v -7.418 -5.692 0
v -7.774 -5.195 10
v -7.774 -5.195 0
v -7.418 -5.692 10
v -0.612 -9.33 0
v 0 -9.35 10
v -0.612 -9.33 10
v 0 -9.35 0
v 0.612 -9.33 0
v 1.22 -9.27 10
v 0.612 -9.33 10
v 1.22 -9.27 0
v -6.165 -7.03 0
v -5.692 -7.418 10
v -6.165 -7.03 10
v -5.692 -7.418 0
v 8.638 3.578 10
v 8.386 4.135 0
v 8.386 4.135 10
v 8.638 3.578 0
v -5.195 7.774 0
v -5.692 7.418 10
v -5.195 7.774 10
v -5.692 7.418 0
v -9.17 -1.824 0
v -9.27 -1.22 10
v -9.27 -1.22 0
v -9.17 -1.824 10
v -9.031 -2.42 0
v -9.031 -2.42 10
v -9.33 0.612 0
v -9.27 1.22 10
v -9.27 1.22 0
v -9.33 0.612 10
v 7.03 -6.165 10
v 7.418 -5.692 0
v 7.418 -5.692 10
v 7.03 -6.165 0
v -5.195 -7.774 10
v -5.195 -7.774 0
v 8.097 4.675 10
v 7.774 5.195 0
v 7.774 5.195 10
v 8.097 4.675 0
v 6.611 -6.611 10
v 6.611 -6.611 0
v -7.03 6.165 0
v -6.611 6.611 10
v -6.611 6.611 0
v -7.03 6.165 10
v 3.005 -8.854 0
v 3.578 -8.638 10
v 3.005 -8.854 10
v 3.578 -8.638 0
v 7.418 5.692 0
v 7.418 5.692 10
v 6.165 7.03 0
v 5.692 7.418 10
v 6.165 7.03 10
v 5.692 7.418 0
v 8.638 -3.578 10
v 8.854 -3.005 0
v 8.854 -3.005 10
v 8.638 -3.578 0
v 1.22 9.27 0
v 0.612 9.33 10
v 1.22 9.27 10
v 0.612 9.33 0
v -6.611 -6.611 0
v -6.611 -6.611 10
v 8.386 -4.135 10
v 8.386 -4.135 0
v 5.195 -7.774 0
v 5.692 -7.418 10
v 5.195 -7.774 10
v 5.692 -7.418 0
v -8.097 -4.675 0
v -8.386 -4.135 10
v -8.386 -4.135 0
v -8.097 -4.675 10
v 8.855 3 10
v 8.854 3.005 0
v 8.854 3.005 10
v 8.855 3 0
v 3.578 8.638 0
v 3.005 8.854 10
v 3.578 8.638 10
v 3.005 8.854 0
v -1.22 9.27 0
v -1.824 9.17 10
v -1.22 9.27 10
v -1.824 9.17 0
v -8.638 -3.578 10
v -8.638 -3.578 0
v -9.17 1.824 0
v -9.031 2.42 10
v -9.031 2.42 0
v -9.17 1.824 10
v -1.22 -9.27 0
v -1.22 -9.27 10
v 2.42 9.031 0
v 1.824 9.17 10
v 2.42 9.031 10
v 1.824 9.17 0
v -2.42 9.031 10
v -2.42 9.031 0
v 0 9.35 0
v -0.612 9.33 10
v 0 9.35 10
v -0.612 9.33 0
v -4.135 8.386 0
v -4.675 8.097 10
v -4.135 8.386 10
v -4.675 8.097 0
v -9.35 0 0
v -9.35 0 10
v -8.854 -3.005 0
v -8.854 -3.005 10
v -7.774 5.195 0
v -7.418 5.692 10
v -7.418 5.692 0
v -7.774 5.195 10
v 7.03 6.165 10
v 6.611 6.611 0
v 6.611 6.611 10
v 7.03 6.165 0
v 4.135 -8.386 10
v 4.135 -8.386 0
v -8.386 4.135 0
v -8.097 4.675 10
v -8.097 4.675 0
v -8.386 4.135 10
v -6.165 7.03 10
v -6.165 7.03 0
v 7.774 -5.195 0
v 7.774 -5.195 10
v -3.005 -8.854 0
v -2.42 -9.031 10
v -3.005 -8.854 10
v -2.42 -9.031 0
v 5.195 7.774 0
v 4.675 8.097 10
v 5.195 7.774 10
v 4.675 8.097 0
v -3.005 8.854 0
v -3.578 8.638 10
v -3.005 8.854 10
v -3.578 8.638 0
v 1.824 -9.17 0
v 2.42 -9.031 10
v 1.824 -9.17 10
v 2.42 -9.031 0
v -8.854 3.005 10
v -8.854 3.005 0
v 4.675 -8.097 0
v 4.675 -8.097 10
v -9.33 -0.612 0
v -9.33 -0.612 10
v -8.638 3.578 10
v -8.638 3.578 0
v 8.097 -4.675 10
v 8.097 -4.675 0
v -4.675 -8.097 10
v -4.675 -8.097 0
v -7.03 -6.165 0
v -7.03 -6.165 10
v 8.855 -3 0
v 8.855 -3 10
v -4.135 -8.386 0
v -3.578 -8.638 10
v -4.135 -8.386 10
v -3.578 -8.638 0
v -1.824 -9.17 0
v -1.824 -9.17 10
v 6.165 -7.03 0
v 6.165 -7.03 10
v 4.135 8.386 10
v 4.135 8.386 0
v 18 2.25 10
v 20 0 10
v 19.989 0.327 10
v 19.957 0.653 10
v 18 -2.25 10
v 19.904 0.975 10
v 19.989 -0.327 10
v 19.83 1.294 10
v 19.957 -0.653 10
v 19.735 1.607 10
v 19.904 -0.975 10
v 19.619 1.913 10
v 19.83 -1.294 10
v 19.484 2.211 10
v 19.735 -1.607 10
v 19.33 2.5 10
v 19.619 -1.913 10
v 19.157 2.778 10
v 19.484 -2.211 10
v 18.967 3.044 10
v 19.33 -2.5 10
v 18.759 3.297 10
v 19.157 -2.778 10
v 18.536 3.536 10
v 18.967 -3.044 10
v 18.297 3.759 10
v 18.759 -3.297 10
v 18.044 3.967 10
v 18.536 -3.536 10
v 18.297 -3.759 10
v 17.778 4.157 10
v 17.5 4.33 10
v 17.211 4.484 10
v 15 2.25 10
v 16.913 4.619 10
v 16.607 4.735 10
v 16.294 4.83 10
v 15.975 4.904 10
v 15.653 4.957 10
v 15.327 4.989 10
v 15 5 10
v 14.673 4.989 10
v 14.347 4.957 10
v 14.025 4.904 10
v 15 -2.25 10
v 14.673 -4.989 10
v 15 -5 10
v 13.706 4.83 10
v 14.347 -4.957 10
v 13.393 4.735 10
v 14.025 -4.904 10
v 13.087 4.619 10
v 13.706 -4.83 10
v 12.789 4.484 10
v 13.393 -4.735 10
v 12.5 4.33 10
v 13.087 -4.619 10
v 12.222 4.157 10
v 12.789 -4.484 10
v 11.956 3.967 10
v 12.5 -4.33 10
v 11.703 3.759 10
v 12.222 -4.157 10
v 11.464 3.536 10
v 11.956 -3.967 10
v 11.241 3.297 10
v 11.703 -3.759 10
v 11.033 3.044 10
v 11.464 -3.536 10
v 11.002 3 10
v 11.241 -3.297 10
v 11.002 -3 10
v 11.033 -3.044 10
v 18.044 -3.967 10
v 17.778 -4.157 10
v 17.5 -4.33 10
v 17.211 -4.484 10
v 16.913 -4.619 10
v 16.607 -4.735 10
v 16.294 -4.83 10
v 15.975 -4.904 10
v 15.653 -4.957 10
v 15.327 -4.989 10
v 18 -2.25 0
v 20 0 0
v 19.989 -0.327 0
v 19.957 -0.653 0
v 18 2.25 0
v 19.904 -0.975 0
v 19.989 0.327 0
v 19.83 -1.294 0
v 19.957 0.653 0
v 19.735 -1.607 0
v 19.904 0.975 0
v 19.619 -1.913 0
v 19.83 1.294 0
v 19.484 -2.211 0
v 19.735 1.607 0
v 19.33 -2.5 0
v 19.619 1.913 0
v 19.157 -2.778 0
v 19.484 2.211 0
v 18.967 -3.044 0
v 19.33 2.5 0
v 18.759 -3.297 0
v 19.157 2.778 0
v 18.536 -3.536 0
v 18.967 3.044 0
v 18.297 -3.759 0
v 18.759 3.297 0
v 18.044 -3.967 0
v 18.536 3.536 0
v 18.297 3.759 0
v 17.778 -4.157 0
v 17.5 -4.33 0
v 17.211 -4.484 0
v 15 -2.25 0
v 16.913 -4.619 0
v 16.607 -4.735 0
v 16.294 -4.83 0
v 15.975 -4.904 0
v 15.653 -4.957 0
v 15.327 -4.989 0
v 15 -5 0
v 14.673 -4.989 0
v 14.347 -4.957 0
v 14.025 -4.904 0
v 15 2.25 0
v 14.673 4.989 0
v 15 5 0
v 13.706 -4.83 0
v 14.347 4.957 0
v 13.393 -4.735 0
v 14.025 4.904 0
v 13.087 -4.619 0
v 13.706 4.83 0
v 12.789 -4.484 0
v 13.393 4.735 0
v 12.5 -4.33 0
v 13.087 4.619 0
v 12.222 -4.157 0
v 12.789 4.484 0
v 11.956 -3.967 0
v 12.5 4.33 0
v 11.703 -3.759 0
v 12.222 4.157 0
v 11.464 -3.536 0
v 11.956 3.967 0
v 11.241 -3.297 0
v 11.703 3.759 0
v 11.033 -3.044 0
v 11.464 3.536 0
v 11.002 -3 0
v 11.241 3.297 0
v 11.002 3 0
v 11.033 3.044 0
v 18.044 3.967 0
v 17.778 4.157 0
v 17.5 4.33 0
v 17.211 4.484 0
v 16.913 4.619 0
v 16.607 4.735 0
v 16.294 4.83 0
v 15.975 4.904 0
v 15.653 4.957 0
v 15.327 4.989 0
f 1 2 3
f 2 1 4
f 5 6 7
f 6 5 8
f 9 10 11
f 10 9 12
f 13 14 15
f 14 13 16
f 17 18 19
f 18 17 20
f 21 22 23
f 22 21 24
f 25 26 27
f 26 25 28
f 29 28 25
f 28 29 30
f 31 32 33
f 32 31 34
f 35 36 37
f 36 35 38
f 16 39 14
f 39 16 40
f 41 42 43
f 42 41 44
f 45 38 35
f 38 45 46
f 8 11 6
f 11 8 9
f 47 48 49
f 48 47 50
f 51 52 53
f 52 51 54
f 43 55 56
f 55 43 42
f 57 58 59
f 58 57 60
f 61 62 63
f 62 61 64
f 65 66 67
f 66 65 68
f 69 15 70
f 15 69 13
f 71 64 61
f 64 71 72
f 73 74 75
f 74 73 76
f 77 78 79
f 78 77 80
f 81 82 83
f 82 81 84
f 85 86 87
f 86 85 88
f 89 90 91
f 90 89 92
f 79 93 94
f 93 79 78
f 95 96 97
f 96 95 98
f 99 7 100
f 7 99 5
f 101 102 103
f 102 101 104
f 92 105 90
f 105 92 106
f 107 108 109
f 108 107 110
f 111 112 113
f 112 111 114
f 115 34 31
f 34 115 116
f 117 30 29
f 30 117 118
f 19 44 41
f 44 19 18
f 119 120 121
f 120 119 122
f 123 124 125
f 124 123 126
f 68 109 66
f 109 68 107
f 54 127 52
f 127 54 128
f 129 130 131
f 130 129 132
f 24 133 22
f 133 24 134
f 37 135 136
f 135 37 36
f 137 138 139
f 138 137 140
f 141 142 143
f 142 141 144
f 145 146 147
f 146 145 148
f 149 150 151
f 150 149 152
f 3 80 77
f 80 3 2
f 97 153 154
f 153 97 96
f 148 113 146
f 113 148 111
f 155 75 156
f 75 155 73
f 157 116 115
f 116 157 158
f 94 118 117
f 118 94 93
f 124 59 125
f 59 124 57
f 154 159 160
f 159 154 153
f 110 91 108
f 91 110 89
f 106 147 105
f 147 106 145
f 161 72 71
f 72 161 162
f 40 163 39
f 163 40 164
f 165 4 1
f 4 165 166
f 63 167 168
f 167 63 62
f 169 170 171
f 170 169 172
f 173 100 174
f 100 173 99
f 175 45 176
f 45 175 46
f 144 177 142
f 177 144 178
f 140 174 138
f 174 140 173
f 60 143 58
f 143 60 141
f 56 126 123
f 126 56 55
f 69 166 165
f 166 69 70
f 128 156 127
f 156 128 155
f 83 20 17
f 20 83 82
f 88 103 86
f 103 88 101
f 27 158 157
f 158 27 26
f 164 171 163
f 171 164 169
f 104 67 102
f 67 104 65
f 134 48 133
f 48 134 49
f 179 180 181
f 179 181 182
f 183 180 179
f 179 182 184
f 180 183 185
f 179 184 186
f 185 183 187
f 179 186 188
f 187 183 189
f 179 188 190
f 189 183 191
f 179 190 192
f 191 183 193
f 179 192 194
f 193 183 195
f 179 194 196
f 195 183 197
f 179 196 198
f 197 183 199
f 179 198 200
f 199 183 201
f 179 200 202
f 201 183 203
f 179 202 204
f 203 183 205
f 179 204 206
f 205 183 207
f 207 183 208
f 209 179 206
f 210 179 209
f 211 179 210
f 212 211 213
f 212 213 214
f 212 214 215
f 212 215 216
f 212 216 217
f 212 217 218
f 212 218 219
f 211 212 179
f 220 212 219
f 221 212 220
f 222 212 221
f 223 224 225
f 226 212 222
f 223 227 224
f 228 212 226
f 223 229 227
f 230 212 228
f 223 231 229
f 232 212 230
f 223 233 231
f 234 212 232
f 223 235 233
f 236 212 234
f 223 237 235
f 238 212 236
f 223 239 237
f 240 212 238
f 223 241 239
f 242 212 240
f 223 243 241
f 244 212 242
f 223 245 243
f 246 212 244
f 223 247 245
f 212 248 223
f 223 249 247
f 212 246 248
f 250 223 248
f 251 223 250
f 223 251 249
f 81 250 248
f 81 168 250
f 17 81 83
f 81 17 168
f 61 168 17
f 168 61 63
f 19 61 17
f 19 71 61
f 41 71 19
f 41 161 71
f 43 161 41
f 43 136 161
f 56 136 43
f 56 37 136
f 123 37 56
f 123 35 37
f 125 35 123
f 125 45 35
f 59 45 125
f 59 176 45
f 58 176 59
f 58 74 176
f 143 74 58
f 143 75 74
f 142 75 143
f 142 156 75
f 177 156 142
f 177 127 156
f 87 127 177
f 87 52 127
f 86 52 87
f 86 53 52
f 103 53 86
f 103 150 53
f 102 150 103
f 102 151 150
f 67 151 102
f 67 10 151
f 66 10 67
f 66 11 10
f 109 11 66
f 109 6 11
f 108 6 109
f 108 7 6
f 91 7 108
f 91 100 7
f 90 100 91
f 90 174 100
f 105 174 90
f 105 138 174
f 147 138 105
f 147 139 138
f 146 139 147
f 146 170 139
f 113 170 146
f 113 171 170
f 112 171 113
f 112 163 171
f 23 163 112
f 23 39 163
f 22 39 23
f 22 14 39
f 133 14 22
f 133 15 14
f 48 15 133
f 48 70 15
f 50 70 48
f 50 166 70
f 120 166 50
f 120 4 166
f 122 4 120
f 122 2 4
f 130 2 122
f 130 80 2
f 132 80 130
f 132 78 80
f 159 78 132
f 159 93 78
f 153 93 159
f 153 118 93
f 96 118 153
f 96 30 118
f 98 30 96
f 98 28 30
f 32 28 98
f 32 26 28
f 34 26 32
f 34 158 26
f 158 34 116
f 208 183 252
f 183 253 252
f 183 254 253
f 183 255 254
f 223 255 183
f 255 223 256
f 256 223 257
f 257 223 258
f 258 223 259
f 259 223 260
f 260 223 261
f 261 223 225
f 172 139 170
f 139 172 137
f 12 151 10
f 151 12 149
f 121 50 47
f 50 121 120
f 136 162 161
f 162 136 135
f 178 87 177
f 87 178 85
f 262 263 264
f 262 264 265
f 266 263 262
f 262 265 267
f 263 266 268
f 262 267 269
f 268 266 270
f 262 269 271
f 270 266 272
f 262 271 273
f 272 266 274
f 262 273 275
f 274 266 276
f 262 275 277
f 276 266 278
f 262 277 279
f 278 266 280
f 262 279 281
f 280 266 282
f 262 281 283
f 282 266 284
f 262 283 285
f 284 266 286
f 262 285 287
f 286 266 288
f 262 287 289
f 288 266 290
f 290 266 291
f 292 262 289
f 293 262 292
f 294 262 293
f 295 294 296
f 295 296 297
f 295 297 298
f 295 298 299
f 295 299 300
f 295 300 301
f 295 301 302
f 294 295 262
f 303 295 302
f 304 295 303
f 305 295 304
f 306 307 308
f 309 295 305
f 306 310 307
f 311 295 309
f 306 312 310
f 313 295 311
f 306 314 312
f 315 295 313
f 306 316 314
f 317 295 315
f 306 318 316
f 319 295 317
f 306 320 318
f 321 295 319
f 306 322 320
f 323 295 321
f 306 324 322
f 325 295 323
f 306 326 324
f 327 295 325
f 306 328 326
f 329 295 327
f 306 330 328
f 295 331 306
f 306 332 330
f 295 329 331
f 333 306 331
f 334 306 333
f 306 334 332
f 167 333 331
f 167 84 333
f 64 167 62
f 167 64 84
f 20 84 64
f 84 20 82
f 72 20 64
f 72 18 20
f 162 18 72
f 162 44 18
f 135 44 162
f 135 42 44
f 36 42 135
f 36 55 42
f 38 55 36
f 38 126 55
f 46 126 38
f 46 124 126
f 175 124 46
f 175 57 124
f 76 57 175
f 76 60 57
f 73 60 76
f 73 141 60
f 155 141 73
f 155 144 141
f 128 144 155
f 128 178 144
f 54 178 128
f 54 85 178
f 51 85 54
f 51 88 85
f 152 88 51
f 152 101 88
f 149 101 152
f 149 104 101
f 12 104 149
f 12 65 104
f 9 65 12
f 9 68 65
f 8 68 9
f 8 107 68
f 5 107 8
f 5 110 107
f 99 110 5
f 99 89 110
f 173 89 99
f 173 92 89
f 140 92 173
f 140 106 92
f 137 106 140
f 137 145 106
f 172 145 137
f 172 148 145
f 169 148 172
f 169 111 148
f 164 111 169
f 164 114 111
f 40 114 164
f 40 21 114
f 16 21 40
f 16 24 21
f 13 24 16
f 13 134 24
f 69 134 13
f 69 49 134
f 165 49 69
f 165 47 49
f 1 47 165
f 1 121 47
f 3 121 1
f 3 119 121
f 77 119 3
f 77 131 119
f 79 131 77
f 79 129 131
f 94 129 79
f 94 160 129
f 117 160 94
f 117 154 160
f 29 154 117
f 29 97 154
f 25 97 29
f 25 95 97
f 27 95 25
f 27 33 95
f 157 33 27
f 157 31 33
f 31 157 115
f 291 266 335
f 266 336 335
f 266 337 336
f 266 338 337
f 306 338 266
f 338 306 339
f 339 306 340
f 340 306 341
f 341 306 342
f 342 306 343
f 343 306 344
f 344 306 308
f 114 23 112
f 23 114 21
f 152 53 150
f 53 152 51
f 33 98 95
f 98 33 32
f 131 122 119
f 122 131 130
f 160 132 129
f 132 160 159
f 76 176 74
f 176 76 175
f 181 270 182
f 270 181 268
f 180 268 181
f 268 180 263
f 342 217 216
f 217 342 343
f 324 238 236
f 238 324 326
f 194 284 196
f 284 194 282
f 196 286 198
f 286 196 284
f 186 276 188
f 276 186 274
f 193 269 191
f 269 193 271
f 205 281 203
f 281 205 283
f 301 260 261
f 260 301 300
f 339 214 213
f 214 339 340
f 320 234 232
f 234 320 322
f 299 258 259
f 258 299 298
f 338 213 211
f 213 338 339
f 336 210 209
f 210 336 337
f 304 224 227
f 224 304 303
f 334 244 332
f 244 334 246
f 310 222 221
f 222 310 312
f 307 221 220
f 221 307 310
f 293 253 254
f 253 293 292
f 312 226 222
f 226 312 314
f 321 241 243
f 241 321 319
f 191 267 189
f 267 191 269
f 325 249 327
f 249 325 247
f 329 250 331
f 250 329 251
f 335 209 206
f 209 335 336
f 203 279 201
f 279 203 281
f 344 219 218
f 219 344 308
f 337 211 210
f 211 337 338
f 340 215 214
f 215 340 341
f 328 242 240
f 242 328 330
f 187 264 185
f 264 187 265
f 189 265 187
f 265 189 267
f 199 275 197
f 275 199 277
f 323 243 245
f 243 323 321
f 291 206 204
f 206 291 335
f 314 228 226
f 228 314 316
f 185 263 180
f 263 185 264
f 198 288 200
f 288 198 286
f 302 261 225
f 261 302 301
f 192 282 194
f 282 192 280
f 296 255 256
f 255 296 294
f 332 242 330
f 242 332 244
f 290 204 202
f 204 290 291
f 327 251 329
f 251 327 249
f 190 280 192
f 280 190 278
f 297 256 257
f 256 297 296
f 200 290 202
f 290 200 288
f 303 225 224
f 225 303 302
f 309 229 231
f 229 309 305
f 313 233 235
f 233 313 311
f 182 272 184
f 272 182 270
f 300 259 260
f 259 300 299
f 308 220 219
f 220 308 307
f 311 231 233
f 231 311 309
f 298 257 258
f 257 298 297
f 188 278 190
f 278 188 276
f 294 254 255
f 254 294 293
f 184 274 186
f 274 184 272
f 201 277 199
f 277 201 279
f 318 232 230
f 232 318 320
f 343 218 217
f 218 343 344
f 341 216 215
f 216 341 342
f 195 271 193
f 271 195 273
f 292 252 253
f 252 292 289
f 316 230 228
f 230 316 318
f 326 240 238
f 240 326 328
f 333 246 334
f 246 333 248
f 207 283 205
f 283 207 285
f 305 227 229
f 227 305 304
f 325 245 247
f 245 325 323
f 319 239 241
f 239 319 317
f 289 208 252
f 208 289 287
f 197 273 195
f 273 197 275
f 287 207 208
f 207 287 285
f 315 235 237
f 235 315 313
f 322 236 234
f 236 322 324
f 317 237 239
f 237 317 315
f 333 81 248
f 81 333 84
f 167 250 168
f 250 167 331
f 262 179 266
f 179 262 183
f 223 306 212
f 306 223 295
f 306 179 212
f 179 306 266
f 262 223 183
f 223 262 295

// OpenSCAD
// Tubing/stand rod snap-on clip
// Print orientation: flat on bed, z = 0 up to z = height

// ---------- Parameters ----------
height      = 10;     // extrusion height (Z)
rod_d       = 12.7;   // stand rod diameter
rod_wall    = 3;      // rod ring wall thickness
rod_open    = 10;     // rod ring opening width (Y)
rod_open_x  = -0.01;  // rod ring opening centre (X), left of ring

tub_d       = 6;      // tubing inner diameter
tub_wall    = 2;      // tubing ring wall thickness
tub_x       = 15;     // tubing ring centre X
tub_open    = 4.5;    // tubing ring opening width (Y)
tub_open_x  = 15;     // tubing ring opening centre (X)

bridge_w    = 6;      // solid bridge width (Y)
bridge_x0   = 8;      // solid bridge start X
bridge_x1   = 12;     // solid bridge end X

eps         = 0.5;    // cutter overshoot past faces
$fn         = 96;     // curve resolution

// ---------- Derived ----------
rod_d_out   = rod_d + 2 * rod_wall;
tub_d_out   = tub_d + 2 * tub_wall;

// ---------- Model ----------
difference() {
    union() {
        // Rod ring
        cylinder(d = rod_d_out, h = height);

        // Tubing ring
        translate([tub_x, 0, 0])
            cylinder(d = tub_d_out, h = height);

        // Solid bridge
        translate([bridge_x0, -bridge_w / 2, 0])
            cube([bridge_x1 - bridge_x0, bridge_w, height]);
    }

    // Cut out: rod ring opening on -X side
    translate([rod_open_x, -rod_open / 2, -eps])
        cube([rod_open_x - bridge_x0, rod_open, height + 2 * eps]);

    // Cut out: tubing ring opening on +X side
    translate([tub_open_x, -tub_open / 2, -eps])
        cube([tub_open_x - bridge_x1, tub_open, height + 2 * eps]);
}
